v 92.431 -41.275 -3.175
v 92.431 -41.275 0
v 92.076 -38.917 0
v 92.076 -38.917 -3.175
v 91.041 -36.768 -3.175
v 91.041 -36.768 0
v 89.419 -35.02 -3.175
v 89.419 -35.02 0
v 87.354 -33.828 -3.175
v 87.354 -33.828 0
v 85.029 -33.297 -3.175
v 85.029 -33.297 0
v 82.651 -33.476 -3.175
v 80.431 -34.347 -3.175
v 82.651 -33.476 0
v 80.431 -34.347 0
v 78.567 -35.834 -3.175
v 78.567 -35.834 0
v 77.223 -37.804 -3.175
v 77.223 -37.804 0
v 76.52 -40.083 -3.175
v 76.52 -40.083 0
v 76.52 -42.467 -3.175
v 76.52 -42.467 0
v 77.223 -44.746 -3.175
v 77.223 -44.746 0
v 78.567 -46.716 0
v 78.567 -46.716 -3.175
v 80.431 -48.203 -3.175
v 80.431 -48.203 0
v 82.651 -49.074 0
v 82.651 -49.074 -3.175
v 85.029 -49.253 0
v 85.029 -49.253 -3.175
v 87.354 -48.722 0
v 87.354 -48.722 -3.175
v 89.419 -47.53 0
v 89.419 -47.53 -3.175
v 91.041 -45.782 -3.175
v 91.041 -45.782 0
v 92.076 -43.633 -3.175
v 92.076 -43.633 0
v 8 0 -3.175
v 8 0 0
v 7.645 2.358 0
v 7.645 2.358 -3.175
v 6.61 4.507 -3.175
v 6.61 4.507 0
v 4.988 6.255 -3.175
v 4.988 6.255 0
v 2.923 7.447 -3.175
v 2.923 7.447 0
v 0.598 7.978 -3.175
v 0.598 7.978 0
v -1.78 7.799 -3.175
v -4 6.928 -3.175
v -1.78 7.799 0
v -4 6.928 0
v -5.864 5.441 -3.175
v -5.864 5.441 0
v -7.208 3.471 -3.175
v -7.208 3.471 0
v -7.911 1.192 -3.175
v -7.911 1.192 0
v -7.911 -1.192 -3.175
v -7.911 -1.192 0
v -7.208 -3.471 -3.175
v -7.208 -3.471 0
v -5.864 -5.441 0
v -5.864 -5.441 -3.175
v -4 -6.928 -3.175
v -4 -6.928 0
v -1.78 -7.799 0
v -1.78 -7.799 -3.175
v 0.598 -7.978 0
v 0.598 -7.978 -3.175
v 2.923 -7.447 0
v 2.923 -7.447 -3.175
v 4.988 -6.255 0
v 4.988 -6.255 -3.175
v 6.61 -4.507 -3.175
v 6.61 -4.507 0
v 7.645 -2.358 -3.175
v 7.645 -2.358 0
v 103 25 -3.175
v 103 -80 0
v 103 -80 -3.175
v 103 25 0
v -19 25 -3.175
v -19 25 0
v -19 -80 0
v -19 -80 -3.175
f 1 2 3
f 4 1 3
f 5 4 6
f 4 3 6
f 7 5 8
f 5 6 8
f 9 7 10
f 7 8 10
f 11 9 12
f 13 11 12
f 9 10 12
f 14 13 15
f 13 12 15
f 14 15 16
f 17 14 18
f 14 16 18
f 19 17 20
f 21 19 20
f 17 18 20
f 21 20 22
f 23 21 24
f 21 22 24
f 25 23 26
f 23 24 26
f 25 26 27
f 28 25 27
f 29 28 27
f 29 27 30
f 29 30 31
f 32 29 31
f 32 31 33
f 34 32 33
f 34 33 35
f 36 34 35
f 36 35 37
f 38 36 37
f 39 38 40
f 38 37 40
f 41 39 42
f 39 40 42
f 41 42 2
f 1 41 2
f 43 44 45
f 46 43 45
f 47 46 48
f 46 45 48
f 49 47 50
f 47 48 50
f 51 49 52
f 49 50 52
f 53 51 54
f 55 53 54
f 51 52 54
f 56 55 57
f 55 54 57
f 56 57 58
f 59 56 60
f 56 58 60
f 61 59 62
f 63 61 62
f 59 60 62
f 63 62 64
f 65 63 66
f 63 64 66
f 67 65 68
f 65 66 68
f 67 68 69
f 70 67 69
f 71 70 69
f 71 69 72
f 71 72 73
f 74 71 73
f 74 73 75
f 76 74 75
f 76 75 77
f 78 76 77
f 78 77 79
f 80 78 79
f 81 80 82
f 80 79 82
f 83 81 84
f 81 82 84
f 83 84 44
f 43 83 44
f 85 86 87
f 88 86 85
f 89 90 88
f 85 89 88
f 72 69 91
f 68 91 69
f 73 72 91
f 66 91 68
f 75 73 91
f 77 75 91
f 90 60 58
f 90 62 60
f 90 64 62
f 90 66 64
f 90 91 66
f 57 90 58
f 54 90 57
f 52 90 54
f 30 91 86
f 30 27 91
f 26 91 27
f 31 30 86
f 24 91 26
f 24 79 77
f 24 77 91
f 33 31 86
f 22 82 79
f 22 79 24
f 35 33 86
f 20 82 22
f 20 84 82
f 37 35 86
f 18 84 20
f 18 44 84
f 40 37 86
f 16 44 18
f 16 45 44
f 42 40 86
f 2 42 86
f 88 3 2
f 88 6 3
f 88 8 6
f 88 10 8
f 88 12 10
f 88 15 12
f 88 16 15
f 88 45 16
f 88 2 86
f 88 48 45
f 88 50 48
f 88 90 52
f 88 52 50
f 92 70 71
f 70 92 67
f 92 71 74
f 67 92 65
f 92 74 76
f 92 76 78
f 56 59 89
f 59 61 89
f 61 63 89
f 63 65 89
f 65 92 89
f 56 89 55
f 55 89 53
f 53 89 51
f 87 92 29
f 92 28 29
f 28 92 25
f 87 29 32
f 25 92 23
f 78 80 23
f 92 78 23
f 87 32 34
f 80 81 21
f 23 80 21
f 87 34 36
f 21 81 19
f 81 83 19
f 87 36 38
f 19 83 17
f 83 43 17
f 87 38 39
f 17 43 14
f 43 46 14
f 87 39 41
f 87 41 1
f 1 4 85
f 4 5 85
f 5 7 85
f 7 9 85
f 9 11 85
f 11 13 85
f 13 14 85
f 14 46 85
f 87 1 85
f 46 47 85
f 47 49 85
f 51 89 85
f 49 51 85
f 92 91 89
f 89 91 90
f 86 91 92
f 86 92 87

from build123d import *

# Parameters (mm, degrees)
SKETCH1_W           = 122
SKETCH1_H           = 105
SKETCH1_R           = 8
BOSS_EXTRUDE1_DEPTH = 3.175


with BuildPart() as part:
    # Sketch1 → Boss-Extrude1 (new body)
    with BuildSketch(Plane.XY):
        with Locations((42, -27.5)):
            Rectangle(SKETCH1_W, SKETCH1_H)
        with Locations((84.431124445, -41.275)):
            Circle(SKETCH1_R, mode=Mode.SUBTRACT)
        Circle(SKETCH1_R, mode=Mode.SUBTRACT)
    extrude(amount=-BOSS_EXTRUDE1_DEPTH)


solid = part.part
